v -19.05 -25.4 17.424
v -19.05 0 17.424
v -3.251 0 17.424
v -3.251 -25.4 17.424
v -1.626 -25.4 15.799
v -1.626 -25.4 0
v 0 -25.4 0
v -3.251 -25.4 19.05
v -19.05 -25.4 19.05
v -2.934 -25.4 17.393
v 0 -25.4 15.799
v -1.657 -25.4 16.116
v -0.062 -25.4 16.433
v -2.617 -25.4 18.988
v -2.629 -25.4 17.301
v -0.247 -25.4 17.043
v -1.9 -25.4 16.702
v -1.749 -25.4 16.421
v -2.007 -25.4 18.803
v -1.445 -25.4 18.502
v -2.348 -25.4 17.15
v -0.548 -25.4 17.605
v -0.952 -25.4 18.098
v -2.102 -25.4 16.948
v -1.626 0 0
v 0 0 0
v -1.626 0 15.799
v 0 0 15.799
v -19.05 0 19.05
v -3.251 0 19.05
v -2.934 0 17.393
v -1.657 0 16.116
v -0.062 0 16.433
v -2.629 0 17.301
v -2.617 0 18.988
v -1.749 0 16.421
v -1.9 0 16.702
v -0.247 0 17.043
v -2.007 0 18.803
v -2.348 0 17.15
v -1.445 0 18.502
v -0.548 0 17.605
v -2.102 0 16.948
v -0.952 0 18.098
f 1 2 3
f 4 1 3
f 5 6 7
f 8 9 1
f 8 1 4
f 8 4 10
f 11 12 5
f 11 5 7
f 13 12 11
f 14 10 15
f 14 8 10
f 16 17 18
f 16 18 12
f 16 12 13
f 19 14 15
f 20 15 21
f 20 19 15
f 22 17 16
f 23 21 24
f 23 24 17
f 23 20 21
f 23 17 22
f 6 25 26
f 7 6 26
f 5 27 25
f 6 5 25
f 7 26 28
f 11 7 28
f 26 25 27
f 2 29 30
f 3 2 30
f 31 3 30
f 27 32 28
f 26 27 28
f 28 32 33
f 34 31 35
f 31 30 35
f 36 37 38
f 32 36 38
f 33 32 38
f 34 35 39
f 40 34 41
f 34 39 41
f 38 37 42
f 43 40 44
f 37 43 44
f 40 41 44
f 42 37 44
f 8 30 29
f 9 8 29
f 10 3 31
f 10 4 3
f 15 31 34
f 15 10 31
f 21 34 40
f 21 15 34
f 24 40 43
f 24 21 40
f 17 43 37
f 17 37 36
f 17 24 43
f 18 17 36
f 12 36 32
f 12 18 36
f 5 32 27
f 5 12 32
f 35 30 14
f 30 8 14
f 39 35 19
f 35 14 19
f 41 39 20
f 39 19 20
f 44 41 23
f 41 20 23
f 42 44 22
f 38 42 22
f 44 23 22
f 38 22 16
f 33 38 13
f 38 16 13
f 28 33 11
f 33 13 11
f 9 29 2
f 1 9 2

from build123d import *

# Parameters (mm, degrees)
F1_DEPTH = 25.4
F2_R     = 1.6256
F3_R     = 3.2512


with BuildPart() as f1:
    # F0 (on Front) → F1 (new body)
    with BuildSketch(Plane.XZ):
        Polygon((-1.6256, 0), (0, 0), (0, 19.05), (-19.05, 19.05), (-19.05, 17.4244), (-1.6256, 17.4244), align=None)
    extrude(amount=F1_DEPTH)

    # F2
    f2_edges = [f1.edges().sort_by_distance(p)[0] for p in [
        (-1.6256, -12.7, 17.4244),
    ]]
    fillet(f2_edges, radius=F2_R)

    # F3
    f3_edges = [f1.edges().sort_by_distance(p)[0] for p in [
        (0, -12.7, 19.05),
    ]]
    fillet(f3_edges, radius=F3_R)


solid = f1.part
